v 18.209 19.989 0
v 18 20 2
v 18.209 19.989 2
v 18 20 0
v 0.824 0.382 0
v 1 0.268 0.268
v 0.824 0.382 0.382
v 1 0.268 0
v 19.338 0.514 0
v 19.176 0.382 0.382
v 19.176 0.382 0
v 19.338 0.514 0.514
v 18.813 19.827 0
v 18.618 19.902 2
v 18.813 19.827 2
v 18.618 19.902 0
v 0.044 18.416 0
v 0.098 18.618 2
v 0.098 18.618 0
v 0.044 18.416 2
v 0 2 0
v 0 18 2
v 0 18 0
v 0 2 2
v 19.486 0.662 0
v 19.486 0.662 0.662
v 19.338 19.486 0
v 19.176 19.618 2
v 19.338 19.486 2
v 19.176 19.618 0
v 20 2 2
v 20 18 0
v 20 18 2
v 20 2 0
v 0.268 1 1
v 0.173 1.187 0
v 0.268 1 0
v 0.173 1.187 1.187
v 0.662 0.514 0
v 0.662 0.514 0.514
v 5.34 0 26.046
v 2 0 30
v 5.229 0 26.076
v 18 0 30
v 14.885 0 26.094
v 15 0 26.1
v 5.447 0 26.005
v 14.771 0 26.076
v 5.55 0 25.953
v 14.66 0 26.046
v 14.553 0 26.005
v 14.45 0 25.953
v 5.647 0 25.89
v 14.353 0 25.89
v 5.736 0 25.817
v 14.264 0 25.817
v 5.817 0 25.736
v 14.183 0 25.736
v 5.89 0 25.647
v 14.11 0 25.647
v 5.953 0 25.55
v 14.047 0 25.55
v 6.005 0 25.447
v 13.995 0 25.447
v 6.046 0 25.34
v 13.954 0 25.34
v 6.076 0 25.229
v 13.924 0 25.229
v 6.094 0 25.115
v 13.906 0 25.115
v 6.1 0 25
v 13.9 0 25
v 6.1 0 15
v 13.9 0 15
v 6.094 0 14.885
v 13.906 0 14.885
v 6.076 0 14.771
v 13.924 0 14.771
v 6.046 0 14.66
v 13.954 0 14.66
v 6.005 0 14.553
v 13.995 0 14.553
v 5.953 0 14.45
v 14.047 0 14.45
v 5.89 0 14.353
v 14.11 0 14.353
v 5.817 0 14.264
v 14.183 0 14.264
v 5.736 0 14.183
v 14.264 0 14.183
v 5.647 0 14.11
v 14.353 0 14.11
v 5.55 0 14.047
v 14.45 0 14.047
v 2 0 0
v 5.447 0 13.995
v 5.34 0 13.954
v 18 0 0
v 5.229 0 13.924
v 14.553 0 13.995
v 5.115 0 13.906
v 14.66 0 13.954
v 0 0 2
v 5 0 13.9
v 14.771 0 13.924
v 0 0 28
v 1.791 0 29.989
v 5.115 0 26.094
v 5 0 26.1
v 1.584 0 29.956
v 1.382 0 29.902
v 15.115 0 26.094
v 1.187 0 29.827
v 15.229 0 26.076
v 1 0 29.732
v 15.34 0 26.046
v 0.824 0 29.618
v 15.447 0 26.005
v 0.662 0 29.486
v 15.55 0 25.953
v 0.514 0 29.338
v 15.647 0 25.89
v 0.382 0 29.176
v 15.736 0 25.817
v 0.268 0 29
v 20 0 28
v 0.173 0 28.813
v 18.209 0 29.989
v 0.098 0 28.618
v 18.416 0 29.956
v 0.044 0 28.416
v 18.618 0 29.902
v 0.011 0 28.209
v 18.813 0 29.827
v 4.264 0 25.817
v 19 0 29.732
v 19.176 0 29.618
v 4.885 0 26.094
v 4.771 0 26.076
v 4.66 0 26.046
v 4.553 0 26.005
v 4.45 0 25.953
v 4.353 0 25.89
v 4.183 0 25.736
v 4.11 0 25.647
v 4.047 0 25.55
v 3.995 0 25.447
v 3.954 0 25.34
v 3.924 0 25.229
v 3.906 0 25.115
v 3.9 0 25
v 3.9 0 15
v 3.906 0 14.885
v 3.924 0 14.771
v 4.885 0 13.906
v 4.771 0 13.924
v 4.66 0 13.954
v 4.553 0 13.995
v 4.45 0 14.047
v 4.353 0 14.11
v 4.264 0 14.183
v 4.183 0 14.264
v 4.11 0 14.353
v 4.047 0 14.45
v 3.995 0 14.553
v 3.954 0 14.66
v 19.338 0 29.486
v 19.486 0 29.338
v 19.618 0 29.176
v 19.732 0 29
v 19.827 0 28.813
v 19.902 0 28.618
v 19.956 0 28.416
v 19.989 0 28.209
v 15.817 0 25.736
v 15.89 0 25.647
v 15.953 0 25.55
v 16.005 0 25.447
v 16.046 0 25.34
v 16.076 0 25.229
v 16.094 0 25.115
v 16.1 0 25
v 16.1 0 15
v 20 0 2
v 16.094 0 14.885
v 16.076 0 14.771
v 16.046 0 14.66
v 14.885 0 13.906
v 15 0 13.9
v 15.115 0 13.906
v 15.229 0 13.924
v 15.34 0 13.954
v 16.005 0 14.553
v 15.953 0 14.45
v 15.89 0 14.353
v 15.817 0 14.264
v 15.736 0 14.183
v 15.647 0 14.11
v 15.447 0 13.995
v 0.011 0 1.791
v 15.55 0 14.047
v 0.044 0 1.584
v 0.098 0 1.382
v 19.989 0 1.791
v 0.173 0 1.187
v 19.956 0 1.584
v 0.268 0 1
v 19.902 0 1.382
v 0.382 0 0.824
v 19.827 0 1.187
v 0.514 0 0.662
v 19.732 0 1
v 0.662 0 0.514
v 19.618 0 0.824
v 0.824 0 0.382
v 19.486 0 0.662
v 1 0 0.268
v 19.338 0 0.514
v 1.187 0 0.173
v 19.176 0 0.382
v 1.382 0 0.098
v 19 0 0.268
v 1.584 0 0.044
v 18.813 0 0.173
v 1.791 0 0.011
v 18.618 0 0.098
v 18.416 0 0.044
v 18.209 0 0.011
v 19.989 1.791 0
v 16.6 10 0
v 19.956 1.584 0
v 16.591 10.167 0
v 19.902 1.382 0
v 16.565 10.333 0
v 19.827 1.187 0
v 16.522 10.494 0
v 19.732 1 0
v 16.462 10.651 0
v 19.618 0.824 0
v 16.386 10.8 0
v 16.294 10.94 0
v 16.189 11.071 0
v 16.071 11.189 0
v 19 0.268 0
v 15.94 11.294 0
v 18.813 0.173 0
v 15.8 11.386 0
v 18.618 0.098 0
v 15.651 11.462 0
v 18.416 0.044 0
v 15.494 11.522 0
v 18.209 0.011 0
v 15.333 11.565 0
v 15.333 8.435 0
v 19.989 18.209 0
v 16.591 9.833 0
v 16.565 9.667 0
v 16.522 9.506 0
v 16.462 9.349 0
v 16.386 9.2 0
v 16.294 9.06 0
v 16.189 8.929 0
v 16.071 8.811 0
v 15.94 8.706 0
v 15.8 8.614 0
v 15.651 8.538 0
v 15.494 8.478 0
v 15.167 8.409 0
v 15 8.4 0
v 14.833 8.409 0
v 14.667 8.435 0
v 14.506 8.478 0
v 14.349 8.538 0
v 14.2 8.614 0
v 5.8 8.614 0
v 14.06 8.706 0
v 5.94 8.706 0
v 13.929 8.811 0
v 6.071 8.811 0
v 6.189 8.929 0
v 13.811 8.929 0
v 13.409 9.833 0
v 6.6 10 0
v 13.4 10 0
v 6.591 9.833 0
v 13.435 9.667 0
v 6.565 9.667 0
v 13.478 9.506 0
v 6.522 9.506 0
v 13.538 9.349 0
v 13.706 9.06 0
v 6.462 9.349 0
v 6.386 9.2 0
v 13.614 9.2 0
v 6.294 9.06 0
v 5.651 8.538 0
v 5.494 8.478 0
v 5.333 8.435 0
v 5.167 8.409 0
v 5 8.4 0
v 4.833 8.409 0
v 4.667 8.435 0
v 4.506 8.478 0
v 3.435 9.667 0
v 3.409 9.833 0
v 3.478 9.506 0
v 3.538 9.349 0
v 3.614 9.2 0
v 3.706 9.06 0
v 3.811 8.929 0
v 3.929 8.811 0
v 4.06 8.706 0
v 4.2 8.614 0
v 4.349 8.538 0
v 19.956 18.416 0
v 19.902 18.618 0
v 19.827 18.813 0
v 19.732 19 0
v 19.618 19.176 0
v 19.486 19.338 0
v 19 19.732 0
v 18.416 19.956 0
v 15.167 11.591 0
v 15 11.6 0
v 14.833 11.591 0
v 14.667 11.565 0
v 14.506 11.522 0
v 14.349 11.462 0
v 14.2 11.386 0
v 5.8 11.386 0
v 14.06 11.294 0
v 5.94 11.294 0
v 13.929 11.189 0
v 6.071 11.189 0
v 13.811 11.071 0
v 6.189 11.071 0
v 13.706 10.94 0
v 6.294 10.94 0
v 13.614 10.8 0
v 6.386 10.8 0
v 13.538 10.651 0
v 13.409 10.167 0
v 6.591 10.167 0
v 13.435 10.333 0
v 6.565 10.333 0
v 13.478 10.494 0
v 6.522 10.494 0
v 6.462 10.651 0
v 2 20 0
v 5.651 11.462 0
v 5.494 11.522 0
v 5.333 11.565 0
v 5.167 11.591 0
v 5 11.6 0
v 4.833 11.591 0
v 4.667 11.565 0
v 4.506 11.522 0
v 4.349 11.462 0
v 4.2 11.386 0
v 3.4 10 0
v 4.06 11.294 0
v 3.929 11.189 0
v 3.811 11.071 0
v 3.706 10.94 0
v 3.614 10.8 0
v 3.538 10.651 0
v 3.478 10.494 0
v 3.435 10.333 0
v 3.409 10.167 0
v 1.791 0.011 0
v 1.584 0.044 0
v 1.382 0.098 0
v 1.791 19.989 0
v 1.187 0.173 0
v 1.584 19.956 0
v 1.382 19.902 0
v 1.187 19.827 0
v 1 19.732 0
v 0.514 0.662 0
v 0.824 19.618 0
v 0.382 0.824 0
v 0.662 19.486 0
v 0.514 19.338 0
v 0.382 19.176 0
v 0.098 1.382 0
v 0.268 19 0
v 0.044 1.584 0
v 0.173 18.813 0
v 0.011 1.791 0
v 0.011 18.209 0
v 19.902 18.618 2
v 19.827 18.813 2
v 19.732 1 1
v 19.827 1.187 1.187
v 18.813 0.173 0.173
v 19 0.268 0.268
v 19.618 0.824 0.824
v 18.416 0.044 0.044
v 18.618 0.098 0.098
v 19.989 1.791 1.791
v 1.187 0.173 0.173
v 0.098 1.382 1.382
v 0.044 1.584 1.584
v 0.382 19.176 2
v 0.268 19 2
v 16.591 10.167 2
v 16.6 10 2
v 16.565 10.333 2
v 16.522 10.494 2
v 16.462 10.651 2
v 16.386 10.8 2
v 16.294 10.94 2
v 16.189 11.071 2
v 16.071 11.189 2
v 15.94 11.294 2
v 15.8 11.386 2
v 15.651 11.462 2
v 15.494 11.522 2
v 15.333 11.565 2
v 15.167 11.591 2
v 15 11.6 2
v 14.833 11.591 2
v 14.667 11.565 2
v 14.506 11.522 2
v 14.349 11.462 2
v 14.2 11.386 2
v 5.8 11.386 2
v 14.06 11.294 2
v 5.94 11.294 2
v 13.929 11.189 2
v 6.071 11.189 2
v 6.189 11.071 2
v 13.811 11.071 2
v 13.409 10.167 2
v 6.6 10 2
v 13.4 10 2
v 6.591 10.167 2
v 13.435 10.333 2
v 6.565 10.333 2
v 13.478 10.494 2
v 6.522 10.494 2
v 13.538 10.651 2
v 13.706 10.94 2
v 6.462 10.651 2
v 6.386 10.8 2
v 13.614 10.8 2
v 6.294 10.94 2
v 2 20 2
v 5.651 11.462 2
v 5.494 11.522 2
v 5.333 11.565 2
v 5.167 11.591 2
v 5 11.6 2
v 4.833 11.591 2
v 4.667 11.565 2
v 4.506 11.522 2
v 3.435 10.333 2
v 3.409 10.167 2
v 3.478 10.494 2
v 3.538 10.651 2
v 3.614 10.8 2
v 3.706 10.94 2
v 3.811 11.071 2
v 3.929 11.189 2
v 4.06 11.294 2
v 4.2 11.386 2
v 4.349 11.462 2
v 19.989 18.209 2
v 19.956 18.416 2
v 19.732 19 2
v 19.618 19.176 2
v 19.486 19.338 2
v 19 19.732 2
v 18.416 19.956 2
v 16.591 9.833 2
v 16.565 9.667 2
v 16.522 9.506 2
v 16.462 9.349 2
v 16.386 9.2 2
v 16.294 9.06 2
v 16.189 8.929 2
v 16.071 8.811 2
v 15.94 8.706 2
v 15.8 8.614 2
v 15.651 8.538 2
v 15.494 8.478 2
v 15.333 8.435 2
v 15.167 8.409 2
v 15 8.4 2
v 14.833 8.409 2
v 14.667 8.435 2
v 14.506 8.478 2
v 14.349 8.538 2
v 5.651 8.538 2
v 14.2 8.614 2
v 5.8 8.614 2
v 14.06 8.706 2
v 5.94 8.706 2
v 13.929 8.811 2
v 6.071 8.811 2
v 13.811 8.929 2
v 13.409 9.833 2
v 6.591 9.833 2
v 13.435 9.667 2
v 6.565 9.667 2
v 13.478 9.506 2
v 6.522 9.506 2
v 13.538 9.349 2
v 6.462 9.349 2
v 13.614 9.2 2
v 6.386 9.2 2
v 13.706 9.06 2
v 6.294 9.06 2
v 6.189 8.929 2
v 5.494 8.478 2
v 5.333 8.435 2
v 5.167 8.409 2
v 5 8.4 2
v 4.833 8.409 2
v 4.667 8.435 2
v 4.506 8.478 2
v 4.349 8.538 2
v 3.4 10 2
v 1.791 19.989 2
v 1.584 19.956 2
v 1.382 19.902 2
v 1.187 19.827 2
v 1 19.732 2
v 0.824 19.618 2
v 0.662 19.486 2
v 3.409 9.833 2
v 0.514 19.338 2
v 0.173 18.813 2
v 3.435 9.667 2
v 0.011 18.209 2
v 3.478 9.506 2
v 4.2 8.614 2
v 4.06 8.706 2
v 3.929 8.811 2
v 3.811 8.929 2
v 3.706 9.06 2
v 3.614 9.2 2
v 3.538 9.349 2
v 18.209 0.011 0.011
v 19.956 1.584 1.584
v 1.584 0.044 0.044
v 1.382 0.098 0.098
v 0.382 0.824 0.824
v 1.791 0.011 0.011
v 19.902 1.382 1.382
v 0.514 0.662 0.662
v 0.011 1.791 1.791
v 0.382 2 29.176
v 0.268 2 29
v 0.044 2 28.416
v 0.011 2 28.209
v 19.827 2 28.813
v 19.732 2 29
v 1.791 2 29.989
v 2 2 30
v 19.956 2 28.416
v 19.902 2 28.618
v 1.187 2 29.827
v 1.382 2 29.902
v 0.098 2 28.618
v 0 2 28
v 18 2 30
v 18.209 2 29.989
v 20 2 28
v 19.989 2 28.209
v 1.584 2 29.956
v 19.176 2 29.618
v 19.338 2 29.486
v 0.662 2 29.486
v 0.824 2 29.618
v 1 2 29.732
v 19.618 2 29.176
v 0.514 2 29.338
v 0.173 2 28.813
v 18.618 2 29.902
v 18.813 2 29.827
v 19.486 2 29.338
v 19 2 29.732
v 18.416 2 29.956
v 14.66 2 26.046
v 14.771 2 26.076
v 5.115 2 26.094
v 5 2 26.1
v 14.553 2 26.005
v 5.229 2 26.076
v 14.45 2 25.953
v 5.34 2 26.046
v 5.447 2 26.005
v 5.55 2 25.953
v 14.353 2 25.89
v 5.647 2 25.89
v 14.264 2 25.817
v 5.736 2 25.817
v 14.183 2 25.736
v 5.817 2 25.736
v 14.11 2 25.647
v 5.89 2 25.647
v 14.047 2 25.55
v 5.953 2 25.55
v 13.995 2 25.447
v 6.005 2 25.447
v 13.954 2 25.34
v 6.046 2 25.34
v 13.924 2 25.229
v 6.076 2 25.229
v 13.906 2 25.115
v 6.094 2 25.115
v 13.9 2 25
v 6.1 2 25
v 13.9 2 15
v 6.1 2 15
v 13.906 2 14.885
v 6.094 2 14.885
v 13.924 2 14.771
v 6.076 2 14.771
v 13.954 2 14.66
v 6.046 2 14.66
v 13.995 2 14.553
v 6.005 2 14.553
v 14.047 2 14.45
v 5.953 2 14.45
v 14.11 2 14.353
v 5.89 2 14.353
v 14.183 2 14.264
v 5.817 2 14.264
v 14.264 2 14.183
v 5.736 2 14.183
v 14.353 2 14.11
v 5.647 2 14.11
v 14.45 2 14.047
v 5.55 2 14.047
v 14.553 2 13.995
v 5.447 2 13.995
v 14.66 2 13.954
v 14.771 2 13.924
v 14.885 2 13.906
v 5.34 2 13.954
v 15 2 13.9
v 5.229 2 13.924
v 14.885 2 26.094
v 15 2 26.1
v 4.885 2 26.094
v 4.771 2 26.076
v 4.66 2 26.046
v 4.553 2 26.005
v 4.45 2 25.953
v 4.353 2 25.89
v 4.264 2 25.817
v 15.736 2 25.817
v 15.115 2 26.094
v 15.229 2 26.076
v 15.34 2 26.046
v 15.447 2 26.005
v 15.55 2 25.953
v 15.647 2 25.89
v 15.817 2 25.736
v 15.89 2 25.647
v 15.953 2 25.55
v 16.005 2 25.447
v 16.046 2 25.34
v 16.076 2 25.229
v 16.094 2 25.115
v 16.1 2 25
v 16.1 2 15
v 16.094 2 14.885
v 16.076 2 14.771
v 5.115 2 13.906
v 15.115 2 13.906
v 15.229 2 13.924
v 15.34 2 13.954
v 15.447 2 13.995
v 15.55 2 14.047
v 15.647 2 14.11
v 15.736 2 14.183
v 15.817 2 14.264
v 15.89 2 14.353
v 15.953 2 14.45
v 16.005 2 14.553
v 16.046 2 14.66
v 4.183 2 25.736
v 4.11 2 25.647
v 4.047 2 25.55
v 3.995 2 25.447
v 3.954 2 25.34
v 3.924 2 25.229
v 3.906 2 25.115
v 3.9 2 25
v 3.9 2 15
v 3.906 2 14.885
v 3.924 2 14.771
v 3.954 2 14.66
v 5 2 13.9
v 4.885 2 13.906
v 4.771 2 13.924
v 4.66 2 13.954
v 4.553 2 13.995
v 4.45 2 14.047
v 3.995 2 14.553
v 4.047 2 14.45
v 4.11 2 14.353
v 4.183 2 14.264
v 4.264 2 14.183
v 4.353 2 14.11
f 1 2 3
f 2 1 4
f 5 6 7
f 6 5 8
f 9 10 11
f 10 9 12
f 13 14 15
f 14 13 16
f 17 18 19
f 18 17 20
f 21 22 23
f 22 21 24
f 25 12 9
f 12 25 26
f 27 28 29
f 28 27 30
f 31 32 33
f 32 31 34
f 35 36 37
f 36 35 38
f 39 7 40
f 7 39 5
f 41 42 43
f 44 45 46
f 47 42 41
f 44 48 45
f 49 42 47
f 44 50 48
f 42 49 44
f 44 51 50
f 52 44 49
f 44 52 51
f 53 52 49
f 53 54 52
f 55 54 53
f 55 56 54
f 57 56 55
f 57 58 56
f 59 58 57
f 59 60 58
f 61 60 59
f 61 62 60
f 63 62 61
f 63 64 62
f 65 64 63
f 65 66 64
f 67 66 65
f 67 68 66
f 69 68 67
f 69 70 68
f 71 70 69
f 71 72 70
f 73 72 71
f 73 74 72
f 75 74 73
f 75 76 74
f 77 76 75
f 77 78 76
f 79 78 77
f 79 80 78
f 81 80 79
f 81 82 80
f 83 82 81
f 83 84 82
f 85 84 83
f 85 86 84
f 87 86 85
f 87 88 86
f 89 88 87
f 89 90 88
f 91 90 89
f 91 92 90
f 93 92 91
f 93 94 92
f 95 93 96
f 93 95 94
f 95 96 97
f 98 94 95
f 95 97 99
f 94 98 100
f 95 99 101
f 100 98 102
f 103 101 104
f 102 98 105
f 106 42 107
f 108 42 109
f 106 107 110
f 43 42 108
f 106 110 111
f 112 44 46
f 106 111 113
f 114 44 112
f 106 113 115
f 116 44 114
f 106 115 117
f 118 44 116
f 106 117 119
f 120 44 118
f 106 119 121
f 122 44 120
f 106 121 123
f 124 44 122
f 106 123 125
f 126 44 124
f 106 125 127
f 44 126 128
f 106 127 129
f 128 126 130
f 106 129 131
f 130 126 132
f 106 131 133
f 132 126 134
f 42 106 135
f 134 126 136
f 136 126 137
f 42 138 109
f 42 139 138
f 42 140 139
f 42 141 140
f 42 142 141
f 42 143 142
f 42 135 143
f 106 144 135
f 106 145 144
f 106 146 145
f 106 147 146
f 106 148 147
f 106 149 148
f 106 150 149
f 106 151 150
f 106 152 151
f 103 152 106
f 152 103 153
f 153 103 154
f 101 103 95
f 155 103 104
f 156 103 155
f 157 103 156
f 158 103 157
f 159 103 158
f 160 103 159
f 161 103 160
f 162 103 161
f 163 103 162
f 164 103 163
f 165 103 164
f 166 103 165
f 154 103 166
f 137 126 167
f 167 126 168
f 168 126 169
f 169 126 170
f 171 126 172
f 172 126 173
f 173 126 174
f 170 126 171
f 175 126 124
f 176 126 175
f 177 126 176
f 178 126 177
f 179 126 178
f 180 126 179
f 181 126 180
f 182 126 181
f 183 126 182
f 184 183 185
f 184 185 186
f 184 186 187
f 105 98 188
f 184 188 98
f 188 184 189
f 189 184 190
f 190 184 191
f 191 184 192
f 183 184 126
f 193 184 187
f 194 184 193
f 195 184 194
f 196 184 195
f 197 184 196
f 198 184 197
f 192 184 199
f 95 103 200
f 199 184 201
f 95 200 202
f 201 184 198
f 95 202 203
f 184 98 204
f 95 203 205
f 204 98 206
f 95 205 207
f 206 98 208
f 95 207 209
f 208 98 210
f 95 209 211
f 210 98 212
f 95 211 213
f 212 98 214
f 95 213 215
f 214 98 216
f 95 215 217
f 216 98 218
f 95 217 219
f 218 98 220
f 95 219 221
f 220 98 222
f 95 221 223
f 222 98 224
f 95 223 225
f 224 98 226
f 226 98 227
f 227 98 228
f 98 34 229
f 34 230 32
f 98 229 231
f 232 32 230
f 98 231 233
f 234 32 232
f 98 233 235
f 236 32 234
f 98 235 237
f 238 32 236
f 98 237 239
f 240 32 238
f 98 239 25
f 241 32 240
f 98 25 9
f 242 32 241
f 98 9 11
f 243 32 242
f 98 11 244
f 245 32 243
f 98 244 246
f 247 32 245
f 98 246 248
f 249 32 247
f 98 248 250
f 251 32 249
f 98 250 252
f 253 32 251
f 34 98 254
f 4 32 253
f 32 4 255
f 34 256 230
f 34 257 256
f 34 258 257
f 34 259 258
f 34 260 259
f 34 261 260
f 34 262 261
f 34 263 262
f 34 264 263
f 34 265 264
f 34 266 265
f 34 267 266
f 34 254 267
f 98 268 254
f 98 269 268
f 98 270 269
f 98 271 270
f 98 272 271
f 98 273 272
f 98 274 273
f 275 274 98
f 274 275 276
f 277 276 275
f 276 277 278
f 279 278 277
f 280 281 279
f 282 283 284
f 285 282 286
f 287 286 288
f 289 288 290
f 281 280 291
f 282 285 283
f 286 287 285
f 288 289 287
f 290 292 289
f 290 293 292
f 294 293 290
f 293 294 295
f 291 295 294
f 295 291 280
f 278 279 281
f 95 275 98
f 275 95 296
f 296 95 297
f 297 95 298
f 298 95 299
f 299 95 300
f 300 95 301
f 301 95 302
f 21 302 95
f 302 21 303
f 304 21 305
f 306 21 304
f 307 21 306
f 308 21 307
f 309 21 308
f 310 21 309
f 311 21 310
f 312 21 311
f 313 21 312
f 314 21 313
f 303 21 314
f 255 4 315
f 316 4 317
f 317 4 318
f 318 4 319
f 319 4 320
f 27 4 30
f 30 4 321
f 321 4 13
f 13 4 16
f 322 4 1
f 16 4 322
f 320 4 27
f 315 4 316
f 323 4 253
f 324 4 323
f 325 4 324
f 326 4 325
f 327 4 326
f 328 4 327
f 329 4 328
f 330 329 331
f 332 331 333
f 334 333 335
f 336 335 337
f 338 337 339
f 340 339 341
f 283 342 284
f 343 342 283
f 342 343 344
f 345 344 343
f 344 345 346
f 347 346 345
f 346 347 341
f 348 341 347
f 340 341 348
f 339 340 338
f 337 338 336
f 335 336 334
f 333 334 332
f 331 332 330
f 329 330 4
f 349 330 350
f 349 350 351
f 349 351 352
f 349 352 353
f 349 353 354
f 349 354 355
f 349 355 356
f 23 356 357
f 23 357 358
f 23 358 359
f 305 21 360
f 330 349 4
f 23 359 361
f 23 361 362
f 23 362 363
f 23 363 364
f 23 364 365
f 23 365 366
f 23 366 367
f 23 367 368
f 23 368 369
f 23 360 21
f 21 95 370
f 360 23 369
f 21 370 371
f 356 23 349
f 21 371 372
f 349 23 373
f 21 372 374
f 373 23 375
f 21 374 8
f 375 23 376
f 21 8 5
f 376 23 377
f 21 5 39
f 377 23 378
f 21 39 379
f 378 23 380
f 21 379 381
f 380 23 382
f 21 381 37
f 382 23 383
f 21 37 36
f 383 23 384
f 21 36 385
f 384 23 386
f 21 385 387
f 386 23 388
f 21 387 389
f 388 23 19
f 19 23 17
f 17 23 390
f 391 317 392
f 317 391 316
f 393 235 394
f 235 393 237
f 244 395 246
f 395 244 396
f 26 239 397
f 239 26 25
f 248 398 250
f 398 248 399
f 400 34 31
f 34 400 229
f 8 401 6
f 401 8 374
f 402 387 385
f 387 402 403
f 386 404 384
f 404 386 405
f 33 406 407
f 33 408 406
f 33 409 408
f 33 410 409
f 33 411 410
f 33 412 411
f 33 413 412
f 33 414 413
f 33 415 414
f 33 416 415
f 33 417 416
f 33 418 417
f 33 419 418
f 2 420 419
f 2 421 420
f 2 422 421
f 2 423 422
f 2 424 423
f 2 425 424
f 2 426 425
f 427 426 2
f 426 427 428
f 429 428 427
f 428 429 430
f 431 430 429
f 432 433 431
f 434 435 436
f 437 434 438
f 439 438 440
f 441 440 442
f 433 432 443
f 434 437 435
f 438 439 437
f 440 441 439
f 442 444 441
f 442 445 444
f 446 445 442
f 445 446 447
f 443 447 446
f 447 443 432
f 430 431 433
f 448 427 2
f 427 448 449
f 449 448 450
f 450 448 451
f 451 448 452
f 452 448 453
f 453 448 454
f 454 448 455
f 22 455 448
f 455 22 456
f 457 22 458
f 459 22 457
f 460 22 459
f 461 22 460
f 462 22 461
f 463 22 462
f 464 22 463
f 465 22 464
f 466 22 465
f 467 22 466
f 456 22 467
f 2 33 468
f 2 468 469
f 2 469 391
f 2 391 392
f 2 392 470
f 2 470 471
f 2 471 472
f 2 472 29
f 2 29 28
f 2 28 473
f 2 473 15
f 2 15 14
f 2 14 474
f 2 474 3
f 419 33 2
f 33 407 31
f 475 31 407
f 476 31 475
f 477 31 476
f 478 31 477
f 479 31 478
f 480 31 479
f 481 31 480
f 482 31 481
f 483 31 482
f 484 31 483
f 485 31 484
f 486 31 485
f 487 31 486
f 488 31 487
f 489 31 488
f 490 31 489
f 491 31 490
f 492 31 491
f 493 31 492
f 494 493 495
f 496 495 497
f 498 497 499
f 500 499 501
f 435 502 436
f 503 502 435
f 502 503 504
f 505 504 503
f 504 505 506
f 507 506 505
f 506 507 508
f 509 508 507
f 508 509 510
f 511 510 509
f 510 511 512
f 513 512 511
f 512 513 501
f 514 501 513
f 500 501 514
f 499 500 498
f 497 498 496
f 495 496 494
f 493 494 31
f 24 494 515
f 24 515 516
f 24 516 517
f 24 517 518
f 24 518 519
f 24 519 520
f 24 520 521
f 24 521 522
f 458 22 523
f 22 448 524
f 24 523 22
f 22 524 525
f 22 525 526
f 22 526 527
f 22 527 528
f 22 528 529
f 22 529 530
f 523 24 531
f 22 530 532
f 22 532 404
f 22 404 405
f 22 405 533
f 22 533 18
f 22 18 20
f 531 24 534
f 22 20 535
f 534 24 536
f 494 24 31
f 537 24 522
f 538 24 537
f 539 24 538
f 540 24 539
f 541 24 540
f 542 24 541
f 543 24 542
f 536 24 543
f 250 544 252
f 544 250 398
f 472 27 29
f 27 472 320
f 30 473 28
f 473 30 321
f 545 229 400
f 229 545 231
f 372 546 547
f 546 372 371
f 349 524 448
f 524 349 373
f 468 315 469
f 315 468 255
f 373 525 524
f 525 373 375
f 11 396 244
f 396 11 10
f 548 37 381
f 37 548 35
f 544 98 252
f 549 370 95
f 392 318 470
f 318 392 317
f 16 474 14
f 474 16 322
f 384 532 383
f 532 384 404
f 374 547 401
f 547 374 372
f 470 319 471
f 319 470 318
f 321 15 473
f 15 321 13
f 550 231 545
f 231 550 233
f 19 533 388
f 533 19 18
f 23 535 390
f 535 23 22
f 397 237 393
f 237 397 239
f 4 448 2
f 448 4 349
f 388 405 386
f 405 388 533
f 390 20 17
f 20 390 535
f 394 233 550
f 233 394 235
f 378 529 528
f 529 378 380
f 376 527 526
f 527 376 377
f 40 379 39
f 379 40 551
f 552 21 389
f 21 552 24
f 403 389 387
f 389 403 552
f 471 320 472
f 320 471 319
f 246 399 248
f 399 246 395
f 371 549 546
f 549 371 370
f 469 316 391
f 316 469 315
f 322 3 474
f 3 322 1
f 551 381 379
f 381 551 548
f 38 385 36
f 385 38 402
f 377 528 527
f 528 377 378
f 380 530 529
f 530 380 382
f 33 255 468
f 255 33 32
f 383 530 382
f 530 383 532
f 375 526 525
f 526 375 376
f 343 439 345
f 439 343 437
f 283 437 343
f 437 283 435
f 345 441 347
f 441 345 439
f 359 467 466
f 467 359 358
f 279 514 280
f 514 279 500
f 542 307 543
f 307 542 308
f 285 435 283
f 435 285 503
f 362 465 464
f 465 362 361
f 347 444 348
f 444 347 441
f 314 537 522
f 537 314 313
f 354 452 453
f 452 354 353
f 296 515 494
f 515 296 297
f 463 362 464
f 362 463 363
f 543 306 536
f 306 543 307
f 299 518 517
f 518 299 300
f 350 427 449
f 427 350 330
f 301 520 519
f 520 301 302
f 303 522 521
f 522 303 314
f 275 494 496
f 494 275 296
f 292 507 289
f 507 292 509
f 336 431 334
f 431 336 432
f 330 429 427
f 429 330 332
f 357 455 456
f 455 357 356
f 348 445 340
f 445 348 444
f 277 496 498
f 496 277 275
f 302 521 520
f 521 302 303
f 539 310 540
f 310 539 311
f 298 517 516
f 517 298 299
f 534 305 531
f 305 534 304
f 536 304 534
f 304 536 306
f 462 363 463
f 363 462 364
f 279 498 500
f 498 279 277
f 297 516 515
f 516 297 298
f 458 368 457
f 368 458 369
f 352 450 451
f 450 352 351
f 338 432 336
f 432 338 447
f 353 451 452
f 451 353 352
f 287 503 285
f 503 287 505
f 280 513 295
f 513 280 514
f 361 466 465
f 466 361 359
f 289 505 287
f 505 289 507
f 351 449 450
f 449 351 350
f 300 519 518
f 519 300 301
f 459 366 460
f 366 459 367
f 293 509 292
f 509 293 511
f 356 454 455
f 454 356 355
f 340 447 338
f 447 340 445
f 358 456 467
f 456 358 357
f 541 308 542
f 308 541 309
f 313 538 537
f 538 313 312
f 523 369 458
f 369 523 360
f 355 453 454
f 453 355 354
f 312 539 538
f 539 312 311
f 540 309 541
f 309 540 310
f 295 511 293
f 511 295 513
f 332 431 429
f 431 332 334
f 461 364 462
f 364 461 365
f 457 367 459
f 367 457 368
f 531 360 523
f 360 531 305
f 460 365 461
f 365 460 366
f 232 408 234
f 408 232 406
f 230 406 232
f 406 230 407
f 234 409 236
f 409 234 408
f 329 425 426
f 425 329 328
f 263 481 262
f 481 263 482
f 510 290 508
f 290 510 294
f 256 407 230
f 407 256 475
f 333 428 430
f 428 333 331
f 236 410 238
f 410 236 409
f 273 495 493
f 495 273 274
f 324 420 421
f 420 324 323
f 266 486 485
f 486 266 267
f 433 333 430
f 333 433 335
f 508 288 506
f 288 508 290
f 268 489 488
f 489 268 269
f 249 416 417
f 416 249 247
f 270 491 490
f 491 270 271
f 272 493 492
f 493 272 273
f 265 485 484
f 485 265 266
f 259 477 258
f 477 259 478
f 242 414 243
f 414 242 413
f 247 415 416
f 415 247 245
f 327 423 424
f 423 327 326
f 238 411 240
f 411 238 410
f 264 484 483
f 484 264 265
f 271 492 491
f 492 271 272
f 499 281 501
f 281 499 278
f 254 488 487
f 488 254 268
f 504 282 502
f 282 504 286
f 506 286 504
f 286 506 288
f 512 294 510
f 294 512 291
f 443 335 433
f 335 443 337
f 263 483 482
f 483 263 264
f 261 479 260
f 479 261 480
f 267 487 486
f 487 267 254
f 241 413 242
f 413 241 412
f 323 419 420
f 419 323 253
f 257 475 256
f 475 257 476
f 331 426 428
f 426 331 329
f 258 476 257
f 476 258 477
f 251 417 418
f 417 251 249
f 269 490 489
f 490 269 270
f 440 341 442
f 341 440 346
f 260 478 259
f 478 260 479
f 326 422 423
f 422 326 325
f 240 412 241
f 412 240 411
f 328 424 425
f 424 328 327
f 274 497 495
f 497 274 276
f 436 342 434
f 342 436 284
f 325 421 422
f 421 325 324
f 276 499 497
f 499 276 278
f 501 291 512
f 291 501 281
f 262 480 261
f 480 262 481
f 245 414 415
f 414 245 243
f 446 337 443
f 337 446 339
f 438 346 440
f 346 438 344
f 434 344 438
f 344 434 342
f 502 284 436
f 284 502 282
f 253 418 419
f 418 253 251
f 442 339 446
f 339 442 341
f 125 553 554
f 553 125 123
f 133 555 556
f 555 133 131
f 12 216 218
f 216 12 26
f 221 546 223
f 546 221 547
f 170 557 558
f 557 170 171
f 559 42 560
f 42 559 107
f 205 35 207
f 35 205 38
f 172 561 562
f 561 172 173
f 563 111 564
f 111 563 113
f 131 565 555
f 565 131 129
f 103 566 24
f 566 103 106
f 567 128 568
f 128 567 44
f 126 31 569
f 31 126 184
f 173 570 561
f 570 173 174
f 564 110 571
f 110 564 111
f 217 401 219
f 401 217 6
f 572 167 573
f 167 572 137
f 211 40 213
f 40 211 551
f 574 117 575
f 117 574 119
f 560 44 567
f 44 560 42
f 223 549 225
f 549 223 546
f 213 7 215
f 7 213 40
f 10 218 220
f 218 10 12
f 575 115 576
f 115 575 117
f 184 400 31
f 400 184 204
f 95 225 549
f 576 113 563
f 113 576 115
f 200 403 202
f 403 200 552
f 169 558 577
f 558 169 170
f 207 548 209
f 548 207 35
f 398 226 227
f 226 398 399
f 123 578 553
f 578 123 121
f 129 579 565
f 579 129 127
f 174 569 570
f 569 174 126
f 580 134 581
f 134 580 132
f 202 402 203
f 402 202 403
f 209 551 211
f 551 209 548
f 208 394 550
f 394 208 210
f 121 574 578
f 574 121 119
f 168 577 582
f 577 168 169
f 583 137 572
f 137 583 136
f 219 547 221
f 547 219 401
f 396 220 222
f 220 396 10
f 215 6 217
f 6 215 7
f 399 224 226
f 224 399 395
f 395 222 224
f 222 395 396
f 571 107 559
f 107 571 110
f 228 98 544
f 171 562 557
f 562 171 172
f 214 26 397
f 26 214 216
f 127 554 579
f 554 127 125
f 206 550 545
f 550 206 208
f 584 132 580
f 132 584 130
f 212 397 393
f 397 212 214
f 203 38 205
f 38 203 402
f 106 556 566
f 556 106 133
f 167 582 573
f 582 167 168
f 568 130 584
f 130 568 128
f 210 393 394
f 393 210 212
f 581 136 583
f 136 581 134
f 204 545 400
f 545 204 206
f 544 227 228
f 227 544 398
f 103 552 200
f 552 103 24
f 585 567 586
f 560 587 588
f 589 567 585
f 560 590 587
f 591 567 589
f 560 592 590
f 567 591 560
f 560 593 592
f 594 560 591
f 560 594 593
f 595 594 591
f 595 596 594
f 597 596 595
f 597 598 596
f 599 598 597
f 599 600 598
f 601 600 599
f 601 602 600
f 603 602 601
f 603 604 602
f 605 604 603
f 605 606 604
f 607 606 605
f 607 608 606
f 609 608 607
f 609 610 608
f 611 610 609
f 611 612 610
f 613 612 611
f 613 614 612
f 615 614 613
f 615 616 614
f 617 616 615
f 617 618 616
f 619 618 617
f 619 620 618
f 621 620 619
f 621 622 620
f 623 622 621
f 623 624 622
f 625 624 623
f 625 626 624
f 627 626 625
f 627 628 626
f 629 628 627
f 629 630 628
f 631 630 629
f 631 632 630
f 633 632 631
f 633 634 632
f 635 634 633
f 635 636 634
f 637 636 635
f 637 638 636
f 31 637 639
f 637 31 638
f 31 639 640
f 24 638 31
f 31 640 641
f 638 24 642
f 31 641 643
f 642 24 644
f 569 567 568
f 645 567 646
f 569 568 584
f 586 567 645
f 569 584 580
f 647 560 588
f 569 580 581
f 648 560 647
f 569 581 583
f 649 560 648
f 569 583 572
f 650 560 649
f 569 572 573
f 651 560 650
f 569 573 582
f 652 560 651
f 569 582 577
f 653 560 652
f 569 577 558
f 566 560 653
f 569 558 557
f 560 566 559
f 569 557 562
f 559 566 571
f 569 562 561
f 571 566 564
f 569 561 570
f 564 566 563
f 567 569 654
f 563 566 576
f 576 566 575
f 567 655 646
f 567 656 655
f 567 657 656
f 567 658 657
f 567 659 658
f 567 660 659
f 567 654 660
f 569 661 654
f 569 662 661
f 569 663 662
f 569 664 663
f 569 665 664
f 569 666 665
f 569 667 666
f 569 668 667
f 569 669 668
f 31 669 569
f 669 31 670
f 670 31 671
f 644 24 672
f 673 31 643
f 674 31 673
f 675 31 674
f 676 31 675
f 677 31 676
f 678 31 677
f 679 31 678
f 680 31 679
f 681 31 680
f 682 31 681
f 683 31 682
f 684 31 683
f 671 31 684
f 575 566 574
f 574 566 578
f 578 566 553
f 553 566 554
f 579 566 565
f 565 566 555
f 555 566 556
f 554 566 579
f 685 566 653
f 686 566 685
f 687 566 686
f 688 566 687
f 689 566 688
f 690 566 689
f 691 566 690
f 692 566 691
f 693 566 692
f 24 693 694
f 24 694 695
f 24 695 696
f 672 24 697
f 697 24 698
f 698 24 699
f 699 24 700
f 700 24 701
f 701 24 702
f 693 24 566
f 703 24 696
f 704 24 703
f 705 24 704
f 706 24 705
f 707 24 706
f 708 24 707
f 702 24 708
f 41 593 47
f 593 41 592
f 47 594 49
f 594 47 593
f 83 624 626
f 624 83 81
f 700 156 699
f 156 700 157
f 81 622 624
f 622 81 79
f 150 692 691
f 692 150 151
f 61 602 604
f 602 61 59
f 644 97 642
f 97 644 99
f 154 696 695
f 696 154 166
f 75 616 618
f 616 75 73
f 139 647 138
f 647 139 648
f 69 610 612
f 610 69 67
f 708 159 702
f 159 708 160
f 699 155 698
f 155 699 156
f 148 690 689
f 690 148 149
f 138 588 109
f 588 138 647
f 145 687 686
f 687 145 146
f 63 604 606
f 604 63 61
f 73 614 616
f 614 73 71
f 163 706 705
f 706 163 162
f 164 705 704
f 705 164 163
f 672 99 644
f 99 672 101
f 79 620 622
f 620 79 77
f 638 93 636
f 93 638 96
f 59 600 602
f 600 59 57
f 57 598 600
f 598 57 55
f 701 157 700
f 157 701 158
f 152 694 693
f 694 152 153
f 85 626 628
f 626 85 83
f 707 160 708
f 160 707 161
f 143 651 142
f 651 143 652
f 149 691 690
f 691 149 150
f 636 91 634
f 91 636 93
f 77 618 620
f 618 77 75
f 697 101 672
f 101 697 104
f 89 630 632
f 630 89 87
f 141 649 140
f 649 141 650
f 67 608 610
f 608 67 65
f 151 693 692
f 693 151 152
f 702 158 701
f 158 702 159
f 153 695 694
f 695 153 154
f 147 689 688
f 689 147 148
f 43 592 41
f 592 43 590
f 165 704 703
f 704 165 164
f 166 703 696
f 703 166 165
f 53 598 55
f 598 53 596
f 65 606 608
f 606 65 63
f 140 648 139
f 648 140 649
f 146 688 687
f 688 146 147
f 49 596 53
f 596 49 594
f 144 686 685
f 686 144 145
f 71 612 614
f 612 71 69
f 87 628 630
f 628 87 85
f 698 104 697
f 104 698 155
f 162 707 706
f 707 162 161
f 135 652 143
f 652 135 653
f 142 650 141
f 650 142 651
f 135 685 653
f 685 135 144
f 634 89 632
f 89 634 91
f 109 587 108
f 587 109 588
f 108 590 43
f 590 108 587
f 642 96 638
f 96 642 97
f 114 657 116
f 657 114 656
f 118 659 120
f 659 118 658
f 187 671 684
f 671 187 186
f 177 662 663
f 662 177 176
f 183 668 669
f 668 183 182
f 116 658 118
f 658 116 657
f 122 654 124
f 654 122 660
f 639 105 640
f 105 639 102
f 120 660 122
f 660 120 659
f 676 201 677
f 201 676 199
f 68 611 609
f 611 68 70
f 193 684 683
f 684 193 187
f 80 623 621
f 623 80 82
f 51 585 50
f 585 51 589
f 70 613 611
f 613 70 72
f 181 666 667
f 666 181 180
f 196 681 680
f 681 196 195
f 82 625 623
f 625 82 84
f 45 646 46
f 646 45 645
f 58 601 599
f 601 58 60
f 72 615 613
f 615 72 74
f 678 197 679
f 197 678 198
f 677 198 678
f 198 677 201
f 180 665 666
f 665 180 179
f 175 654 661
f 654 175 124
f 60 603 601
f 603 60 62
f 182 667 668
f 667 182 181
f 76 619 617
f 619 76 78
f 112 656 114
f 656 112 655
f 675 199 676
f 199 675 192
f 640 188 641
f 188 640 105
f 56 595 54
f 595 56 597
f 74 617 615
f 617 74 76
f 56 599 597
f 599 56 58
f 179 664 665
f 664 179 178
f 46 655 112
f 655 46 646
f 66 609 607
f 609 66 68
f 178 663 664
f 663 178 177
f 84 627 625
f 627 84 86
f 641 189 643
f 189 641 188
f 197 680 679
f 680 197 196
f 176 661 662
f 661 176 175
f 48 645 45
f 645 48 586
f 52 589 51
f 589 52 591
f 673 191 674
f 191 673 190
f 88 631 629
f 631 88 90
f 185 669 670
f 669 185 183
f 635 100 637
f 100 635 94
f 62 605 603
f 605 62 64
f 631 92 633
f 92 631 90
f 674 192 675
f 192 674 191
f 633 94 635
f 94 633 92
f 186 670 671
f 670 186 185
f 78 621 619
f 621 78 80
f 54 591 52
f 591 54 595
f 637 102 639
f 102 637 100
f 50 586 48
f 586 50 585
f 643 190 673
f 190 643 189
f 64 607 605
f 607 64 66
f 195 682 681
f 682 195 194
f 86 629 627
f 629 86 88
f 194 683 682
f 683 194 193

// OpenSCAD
// Customizable endstop bracket by Cees Moerkerken
// http://www.thingiverse.com/thing:1523711
// v1.0 - 27-04-2016
// preview[view:north, tilt:top]

//CUSTOMIZER VARIABLES

/* [General_dimensions] */
// Thickness of the bracket in mm
thickness=2;
// Width of the bracket
width=20;

/* [Side1_dimensions] */
// Length of the part 
L1=20;
// Distance between the center of the bolts
frame_bolt_space=10;
// Bolt diameter incl margin (m3 = 3.2mm printed)
frame_bolt_d=3.2;// [2.2,3.2,4.2,5.2,6.2]

/* [Side2_dimensions] */
// Length of the part 
L2=30;
// Distance between the center of the bolts
endstop_bolt_space=10;
// Bolt diameter
endstop_bolt_d=2.2;
// Start of the endstop bolt hull on Side 2
endstop_mount_start=15;// [3:45]
// End of the endstop bolt hull on Side 2
endstop_mount_end=25;// [3:45]

//CUSTOMIZER VARIABLES END

/* [Hidden] */
$fn=60;

difference(){
    translate([2,2,0])minkowski(){
        cube([width-4,L1-4,thickness/2]);
        cylinder(r=2,h=thickness/2);
    }
    translate([width/2-frame_bolt_space/2,L1/2,-.1])cylinder(d=frame_bolt_d,h=thickness+.2);
    translate([width/2+frame_bolt_space/2,L1/2,-.1])cylinder(d=frame_bolt_d,h=thickness+.2);
}
difference(){
    translate([2,thickness/2,2])minkowski(){
        cube([width-4,thickness/2,L2-4]);
        rotate([90,0,0])cylinder(r=2,h=thickness/2);
    }
    hull(){
        translate([width/2-endstop_bolt_space/2,thickness+.1,endstop_mount_start])rotate([90,0,0])cylinder(d=endstop_bolt_d, h=thickness+.2);
        translate([width/2-endstop_bolt_space/2,thickness+.1,endstop_mount_end])rotate([90,0,0])cylinder(d=endstop_bolt_d, h=thickness+.2);
    }
    hull(){
        translate([width/2+endstop_bolt_space/2,thickness+.1,endstop_mount_start])rotate([90,0,0])cylinder(d=endstop_bolt_d, h=thickness+.2);
        translate([width/2+endstop_bolt_space/2,thickness+.1,endstop_mount_end])rotate([90,0,0])cylinder(d=endstop_bolt_d, h=thickness+.2);
    }
}
